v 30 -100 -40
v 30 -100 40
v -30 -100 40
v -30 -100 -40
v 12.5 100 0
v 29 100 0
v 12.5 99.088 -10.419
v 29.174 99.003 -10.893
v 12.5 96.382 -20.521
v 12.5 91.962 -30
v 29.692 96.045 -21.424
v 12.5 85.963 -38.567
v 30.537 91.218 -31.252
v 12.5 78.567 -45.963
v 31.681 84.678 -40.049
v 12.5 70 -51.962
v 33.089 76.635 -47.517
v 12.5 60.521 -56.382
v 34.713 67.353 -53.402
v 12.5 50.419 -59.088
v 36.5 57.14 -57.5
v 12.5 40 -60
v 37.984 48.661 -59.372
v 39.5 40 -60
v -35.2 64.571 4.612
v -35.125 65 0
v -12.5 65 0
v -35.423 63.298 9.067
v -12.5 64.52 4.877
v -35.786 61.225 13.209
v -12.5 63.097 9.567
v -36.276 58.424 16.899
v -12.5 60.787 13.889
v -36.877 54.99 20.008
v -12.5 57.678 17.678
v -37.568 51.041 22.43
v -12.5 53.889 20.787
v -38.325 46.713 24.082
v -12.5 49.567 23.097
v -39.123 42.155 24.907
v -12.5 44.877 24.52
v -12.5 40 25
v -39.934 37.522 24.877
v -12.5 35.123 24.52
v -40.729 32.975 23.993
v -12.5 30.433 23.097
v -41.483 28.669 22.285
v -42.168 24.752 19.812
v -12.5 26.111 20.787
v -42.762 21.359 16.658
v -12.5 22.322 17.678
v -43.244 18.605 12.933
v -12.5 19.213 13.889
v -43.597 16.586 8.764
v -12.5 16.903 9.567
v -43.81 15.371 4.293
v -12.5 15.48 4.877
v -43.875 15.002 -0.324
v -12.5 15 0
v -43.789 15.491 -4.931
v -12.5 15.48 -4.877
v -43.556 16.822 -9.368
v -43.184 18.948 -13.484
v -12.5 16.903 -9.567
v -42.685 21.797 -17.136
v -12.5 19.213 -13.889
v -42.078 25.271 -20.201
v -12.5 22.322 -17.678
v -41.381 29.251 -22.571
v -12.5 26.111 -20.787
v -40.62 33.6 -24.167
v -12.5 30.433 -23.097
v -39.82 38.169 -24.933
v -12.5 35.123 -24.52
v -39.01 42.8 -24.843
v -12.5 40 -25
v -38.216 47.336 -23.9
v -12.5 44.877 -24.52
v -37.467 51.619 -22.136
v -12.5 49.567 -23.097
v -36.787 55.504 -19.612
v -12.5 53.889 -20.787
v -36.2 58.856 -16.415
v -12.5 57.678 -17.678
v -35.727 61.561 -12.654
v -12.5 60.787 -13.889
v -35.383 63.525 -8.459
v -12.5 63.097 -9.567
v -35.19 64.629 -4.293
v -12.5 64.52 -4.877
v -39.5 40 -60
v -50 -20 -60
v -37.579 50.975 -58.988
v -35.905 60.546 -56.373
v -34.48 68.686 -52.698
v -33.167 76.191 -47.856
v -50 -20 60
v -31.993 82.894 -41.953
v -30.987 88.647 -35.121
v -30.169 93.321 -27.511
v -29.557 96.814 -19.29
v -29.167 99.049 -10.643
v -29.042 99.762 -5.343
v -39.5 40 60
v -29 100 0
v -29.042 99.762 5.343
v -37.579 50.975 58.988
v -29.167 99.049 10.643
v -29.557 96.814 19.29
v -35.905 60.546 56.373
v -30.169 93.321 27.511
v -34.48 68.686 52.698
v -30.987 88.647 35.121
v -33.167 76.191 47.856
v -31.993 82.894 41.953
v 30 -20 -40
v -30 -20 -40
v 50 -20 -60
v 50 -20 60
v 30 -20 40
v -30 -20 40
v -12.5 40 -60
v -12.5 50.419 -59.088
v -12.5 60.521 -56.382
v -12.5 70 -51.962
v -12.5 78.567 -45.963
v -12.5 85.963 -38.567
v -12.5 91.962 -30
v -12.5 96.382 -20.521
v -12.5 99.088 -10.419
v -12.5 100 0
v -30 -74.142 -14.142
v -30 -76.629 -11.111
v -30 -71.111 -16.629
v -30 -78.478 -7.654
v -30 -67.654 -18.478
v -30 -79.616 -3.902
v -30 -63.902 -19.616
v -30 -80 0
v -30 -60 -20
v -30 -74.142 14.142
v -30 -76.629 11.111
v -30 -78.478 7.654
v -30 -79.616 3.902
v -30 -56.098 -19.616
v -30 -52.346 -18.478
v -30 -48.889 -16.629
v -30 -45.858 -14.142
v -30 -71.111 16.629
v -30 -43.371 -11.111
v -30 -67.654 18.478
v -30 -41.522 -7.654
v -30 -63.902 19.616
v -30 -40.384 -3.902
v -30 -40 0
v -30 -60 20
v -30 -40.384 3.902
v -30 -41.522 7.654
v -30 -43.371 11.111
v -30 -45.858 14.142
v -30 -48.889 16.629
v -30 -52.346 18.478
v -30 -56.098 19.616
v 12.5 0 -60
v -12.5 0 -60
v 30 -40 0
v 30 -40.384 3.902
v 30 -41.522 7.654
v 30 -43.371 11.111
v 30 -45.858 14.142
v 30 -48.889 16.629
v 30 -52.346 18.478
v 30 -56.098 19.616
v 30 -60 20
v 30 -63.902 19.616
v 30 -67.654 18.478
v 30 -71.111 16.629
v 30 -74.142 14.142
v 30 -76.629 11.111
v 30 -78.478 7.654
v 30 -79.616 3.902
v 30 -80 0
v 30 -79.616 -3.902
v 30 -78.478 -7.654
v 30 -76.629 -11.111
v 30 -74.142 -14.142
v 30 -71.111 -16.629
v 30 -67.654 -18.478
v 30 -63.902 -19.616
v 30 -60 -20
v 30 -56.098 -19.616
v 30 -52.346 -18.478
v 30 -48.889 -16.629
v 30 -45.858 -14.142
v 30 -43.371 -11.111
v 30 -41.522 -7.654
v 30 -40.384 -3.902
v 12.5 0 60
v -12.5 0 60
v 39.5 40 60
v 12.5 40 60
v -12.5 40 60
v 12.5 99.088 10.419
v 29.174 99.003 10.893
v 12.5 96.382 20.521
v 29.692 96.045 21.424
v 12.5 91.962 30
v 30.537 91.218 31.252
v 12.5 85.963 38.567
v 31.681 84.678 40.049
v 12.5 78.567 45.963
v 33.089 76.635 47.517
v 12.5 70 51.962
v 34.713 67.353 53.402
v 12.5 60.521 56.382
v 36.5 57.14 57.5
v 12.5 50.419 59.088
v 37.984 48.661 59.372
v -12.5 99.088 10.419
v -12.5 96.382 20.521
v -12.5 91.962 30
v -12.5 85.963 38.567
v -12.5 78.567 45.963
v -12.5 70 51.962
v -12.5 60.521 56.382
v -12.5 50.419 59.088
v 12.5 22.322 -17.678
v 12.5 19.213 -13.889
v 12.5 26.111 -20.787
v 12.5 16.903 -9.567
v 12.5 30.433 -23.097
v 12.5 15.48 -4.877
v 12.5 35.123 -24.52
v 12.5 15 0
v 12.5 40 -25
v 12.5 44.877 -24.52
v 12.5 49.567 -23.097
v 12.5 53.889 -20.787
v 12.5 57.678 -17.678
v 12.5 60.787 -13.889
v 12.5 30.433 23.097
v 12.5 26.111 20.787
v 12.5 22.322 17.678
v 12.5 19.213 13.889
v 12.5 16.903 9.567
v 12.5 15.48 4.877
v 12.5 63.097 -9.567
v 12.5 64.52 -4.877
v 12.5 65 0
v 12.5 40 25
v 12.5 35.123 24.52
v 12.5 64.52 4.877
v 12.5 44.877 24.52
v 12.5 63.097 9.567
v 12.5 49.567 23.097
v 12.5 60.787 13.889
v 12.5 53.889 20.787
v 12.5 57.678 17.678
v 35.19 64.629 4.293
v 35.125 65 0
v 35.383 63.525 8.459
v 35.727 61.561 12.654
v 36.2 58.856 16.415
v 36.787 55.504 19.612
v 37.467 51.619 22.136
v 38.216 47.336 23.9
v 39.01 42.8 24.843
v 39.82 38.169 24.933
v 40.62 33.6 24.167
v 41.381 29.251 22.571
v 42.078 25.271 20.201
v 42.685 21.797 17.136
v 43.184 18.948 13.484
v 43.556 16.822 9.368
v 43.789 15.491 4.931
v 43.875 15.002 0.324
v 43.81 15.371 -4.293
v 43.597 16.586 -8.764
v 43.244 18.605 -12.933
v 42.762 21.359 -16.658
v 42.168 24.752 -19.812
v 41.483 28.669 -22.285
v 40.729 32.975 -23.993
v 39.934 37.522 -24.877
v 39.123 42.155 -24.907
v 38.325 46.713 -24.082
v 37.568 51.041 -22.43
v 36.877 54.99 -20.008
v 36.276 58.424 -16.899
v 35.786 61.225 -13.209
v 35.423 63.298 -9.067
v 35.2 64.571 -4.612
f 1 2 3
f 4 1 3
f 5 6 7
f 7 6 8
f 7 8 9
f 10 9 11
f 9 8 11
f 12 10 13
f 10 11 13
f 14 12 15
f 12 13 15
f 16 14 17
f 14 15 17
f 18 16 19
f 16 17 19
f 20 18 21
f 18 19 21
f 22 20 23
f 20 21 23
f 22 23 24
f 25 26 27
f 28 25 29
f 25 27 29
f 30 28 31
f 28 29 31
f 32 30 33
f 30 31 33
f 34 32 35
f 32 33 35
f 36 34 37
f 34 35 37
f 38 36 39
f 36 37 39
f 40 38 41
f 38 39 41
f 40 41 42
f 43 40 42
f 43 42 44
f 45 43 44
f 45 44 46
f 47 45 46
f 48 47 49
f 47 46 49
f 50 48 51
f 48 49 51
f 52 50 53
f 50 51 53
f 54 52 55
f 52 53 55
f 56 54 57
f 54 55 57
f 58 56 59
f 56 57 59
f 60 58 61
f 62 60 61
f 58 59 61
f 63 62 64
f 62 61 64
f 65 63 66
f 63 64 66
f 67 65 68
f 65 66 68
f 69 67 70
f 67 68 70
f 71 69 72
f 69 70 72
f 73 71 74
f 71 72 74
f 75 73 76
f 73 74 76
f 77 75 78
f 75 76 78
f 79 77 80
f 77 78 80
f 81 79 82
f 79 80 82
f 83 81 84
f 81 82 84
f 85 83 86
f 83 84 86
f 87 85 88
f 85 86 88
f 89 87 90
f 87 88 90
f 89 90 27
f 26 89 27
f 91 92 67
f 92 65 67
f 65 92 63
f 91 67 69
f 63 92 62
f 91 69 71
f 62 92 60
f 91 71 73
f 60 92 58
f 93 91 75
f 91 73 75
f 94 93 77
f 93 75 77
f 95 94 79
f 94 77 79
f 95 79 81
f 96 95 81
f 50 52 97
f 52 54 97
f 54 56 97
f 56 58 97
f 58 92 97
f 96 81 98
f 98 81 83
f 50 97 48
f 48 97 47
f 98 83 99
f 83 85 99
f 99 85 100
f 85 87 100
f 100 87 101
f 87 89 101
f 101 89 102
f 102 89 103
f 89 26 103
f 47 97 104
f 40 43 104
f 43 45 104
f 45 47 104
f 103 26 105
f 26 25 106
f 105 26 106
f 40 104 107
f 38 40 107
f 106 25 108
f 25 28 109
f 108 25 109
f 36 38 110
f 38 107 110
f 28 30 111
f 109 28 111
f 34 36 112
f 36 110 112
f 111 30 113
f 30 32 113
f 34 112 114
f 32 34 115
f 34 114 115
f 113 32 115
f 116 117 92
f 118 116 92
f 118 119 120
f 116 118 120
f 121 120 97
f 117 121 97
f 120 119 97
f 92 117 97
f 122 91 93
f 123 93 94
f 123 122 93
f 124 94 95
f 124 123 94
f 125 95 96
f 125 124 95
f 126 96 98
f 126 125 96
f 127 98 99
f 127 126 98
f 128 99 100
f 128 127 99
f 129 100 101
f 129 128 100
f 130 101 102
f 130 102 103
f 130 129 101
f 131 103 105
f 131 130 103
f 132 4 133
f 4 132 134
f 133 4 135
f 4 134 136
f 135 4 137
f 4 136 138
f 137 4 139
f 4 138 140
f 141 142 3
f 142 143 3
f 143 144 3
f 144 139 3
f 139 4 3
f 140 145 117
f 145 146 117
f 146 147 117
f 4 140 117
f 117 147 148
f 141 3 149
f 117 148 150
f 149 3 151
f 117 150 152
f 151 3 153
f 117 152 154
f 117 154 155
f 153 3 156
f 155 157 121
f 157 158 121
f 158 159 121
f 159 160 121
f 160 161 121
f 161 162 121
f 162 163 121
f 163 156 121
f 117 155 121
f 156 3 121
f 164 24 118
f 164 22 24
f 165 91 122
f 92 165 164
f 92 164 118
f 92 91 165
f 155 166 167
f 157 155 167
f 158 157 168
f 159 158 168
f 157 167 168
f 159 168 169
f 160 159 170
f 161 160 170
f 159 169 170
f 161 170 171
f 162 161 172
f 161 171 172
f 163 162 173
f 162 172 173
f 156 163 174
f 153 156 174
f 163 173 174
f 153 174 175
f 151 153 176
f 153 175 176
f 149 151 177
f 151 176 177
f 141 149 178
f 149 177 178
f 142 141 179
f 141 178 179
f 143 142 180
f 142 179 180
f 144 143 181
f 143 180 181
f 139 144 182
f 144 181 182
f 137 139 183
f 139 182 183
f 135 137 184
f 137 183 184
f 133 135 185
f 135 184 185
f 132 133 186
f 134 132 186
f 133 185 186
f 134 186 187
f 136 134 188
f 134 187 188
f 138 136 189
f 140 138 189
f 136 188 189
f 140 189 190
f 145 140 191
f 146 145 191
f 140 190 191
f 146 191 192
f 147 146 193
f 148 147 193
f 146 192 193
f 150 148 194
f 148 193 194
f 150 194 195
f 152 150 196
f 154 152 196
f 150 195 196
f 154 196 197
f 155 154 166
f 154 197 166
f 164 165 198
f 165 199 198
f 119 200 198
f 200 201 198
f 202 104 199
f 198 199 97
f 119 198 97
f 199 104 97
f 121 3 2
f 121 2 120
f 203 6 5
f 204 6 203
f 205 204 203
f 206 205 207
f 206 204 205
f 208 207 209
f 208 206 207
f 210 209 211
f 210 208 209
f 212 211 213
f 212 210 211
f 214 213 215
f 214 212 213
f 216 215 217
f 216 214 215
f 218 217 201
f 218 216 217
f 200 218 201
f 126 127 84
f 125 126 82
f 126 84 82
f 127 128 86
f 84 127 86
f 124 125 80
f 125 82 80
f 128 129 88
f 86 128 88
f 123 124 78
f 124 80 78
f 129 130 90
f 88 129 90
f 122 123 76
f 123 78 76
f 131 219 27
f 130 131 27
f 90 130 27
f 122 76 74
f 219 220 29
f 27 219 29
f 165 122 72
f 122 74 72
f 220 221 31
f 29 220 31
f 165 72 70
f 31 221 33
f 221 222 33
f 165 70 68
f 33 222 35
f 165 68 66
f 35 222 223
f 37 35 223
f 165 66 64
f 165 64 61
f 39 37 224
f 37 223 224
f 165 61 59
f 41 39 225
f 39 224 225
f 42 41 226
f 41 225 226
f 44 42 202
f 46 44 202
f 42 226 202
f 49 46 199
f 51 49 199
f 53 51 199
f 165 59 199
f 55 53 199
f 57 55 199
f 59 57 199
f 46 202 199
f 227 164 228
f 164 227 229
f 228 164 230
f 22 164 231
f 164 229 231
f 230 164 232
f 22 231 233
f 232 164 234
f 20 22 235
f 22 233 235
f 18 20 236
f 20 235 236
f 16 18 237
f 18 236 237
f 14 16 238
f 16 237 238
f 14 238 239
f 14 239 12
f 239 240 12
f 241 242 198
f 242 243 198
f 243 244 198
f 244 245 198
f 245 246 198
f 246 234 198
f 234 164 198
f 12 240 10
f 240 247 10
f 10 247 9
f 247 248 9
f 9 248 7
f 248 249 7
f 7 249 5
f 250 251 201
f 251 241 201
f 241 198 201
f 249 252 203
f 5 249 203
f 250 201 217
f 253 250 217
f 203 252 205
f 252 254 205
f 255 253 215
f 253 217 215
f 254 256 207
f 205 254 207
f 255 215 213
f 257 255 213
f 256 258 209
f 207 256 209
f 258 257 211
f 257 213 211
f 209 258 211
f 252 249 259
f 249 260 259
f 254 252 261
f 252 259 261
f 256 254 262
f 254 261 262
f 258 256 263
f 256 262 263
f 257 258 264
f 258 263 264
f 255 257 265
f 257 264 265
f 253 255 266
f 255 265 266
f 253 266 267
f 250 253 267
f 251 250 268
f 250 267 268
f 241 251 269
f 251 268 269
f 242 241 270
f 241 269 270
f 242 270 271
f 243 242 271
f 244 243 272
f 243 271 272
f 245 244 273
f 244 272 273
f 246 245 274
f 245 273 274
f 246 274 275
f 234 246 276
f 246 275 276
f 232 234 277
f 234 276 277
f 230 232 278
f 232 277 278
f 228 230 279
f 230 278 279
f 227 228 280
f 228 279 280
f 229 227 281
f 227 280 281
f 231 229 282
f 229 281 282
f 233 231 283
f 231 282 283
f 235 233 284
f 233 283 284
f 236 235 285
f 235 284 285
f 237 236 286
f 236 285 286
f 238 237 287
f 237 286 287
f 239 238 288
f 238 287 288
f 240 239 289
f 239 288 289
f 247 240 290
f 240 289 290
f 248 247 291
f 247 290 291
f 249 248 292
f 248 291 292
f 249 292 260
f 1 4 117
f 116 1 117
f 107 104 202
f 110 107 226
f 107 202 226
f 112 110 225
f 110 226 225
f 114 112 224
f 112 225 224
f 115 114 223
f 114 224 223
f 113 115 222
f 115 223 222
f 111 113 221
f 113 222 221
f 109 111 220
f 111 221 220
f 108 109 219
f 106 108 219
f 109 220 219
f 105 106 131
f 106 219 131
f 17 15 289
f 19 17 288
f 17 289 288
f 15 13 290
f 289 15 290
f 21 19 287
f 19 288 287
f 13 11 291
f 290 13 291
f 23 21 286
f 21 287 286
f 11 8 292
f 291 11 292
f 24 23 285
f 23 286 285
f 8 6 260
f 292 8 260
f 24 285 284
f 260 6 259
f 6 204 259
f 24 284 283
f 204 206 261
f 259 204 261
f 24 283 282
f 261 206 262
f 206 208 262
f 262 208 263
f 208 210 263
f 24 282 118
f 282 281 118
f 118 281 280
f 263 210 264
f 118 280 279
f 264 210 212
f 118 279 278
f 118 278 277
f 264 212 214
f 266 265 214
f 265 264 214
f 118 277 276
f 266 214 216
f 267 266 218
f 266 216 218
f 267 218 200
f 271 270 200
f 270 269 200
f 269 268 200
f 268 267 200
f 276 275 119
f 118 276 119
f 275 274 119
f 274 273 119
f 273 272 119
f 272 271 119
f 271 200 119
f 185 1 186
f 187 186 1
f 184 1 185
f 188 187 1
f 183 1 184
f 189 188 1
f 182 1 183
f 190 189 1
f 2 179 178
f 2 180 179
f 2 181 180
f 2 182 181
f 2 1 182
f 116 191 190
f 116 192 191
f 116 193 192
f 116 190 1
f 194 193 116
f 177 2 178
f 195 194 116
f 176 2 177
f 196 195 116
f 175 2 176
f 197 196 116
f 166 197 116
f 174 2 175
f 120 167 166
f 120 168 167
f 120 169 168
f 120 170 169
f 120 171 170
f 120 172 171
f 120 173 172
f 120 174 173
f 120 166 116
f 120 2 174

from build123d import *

# Parameters (mm, degrees)
SKETCH1_W           = 80
SKETCH1_H           = 60
BOSS_EXTRUDE1_DEPTH = 40
BOSS_EXTRUDE2_DEPTH = 60
SKETCH2_R           = 25
CUT_EXTRUDE2_DEPTH  = 60
FILLET1_R           = 60
SKETCH3_R           = 20
CUT_EXTRUDE3_DEPTH  = 60


with BuildPart() as part:
    # Sketch1 → Boss-Extrude1 (new, symmetric)
    with BuildSketch(Plane(origin=(0, 0, 0), x_dir=(0, 1, 0), z_dir=(0, 0, 1))):
        with Locations((-60, 0)):
            Rectangle(SKETCH1_W, SKETCH1_H)
    extrude(amount=BOSS_EXTRUDE1_DEPTH, both=True)

    # Sketch1<3> → Boss-Extrude2 (add, symmetric)
    with BuildSketch(Plane(origin=(0, 0, 0), x_dir=(0, 1, 0), z_dir=(0, 0, 1))):
        Polygon((100, -29), (-20, -50), (-20, 50), (100, 29), (100, 12.5), (0, 12.5), (0, -12.5), (100, -12.5), align=None)
    extrude(amount=BOSS_EXTRUDE2_DEPTH, both=True)

    # Sketch2 → Cut-Extrude2 (cut, symmetric)
    with BuildSketch(Plane.YZ):
        with Locations((40, 0)):
            Circle(SKETCH2_R)
    extrude(amount=CUT_EXTRUDE2_DEPTH, both=True, mode=Mode.SUBTRACT)

    # Fillet1
    fillet1_edges = [part.edges().sort_by_distance(p)[0] for p in [
        (-20.75, 100, -60),
        (20.75, 100, -60),
        (-20.75, 100, 60),
        (20.75, 100, 60),
    ]]
    fillet(fillet1_edges, radius=FILLET1_R - 0.0001)  # a hair under: the kernel refuses the full size

    # Sketch3 → Cut-Extrude3 (cut, symmetric)
    with BuildSketch(Plane.YZ.offset(30)):
        with Locations((-60, 0)):
            Circle(SKETCH3_R)
    extrude(amount=CUT_EXTRUDE3_DEPTH, both=True, mode=Mode.SUBTRACT)


solid = part.part
